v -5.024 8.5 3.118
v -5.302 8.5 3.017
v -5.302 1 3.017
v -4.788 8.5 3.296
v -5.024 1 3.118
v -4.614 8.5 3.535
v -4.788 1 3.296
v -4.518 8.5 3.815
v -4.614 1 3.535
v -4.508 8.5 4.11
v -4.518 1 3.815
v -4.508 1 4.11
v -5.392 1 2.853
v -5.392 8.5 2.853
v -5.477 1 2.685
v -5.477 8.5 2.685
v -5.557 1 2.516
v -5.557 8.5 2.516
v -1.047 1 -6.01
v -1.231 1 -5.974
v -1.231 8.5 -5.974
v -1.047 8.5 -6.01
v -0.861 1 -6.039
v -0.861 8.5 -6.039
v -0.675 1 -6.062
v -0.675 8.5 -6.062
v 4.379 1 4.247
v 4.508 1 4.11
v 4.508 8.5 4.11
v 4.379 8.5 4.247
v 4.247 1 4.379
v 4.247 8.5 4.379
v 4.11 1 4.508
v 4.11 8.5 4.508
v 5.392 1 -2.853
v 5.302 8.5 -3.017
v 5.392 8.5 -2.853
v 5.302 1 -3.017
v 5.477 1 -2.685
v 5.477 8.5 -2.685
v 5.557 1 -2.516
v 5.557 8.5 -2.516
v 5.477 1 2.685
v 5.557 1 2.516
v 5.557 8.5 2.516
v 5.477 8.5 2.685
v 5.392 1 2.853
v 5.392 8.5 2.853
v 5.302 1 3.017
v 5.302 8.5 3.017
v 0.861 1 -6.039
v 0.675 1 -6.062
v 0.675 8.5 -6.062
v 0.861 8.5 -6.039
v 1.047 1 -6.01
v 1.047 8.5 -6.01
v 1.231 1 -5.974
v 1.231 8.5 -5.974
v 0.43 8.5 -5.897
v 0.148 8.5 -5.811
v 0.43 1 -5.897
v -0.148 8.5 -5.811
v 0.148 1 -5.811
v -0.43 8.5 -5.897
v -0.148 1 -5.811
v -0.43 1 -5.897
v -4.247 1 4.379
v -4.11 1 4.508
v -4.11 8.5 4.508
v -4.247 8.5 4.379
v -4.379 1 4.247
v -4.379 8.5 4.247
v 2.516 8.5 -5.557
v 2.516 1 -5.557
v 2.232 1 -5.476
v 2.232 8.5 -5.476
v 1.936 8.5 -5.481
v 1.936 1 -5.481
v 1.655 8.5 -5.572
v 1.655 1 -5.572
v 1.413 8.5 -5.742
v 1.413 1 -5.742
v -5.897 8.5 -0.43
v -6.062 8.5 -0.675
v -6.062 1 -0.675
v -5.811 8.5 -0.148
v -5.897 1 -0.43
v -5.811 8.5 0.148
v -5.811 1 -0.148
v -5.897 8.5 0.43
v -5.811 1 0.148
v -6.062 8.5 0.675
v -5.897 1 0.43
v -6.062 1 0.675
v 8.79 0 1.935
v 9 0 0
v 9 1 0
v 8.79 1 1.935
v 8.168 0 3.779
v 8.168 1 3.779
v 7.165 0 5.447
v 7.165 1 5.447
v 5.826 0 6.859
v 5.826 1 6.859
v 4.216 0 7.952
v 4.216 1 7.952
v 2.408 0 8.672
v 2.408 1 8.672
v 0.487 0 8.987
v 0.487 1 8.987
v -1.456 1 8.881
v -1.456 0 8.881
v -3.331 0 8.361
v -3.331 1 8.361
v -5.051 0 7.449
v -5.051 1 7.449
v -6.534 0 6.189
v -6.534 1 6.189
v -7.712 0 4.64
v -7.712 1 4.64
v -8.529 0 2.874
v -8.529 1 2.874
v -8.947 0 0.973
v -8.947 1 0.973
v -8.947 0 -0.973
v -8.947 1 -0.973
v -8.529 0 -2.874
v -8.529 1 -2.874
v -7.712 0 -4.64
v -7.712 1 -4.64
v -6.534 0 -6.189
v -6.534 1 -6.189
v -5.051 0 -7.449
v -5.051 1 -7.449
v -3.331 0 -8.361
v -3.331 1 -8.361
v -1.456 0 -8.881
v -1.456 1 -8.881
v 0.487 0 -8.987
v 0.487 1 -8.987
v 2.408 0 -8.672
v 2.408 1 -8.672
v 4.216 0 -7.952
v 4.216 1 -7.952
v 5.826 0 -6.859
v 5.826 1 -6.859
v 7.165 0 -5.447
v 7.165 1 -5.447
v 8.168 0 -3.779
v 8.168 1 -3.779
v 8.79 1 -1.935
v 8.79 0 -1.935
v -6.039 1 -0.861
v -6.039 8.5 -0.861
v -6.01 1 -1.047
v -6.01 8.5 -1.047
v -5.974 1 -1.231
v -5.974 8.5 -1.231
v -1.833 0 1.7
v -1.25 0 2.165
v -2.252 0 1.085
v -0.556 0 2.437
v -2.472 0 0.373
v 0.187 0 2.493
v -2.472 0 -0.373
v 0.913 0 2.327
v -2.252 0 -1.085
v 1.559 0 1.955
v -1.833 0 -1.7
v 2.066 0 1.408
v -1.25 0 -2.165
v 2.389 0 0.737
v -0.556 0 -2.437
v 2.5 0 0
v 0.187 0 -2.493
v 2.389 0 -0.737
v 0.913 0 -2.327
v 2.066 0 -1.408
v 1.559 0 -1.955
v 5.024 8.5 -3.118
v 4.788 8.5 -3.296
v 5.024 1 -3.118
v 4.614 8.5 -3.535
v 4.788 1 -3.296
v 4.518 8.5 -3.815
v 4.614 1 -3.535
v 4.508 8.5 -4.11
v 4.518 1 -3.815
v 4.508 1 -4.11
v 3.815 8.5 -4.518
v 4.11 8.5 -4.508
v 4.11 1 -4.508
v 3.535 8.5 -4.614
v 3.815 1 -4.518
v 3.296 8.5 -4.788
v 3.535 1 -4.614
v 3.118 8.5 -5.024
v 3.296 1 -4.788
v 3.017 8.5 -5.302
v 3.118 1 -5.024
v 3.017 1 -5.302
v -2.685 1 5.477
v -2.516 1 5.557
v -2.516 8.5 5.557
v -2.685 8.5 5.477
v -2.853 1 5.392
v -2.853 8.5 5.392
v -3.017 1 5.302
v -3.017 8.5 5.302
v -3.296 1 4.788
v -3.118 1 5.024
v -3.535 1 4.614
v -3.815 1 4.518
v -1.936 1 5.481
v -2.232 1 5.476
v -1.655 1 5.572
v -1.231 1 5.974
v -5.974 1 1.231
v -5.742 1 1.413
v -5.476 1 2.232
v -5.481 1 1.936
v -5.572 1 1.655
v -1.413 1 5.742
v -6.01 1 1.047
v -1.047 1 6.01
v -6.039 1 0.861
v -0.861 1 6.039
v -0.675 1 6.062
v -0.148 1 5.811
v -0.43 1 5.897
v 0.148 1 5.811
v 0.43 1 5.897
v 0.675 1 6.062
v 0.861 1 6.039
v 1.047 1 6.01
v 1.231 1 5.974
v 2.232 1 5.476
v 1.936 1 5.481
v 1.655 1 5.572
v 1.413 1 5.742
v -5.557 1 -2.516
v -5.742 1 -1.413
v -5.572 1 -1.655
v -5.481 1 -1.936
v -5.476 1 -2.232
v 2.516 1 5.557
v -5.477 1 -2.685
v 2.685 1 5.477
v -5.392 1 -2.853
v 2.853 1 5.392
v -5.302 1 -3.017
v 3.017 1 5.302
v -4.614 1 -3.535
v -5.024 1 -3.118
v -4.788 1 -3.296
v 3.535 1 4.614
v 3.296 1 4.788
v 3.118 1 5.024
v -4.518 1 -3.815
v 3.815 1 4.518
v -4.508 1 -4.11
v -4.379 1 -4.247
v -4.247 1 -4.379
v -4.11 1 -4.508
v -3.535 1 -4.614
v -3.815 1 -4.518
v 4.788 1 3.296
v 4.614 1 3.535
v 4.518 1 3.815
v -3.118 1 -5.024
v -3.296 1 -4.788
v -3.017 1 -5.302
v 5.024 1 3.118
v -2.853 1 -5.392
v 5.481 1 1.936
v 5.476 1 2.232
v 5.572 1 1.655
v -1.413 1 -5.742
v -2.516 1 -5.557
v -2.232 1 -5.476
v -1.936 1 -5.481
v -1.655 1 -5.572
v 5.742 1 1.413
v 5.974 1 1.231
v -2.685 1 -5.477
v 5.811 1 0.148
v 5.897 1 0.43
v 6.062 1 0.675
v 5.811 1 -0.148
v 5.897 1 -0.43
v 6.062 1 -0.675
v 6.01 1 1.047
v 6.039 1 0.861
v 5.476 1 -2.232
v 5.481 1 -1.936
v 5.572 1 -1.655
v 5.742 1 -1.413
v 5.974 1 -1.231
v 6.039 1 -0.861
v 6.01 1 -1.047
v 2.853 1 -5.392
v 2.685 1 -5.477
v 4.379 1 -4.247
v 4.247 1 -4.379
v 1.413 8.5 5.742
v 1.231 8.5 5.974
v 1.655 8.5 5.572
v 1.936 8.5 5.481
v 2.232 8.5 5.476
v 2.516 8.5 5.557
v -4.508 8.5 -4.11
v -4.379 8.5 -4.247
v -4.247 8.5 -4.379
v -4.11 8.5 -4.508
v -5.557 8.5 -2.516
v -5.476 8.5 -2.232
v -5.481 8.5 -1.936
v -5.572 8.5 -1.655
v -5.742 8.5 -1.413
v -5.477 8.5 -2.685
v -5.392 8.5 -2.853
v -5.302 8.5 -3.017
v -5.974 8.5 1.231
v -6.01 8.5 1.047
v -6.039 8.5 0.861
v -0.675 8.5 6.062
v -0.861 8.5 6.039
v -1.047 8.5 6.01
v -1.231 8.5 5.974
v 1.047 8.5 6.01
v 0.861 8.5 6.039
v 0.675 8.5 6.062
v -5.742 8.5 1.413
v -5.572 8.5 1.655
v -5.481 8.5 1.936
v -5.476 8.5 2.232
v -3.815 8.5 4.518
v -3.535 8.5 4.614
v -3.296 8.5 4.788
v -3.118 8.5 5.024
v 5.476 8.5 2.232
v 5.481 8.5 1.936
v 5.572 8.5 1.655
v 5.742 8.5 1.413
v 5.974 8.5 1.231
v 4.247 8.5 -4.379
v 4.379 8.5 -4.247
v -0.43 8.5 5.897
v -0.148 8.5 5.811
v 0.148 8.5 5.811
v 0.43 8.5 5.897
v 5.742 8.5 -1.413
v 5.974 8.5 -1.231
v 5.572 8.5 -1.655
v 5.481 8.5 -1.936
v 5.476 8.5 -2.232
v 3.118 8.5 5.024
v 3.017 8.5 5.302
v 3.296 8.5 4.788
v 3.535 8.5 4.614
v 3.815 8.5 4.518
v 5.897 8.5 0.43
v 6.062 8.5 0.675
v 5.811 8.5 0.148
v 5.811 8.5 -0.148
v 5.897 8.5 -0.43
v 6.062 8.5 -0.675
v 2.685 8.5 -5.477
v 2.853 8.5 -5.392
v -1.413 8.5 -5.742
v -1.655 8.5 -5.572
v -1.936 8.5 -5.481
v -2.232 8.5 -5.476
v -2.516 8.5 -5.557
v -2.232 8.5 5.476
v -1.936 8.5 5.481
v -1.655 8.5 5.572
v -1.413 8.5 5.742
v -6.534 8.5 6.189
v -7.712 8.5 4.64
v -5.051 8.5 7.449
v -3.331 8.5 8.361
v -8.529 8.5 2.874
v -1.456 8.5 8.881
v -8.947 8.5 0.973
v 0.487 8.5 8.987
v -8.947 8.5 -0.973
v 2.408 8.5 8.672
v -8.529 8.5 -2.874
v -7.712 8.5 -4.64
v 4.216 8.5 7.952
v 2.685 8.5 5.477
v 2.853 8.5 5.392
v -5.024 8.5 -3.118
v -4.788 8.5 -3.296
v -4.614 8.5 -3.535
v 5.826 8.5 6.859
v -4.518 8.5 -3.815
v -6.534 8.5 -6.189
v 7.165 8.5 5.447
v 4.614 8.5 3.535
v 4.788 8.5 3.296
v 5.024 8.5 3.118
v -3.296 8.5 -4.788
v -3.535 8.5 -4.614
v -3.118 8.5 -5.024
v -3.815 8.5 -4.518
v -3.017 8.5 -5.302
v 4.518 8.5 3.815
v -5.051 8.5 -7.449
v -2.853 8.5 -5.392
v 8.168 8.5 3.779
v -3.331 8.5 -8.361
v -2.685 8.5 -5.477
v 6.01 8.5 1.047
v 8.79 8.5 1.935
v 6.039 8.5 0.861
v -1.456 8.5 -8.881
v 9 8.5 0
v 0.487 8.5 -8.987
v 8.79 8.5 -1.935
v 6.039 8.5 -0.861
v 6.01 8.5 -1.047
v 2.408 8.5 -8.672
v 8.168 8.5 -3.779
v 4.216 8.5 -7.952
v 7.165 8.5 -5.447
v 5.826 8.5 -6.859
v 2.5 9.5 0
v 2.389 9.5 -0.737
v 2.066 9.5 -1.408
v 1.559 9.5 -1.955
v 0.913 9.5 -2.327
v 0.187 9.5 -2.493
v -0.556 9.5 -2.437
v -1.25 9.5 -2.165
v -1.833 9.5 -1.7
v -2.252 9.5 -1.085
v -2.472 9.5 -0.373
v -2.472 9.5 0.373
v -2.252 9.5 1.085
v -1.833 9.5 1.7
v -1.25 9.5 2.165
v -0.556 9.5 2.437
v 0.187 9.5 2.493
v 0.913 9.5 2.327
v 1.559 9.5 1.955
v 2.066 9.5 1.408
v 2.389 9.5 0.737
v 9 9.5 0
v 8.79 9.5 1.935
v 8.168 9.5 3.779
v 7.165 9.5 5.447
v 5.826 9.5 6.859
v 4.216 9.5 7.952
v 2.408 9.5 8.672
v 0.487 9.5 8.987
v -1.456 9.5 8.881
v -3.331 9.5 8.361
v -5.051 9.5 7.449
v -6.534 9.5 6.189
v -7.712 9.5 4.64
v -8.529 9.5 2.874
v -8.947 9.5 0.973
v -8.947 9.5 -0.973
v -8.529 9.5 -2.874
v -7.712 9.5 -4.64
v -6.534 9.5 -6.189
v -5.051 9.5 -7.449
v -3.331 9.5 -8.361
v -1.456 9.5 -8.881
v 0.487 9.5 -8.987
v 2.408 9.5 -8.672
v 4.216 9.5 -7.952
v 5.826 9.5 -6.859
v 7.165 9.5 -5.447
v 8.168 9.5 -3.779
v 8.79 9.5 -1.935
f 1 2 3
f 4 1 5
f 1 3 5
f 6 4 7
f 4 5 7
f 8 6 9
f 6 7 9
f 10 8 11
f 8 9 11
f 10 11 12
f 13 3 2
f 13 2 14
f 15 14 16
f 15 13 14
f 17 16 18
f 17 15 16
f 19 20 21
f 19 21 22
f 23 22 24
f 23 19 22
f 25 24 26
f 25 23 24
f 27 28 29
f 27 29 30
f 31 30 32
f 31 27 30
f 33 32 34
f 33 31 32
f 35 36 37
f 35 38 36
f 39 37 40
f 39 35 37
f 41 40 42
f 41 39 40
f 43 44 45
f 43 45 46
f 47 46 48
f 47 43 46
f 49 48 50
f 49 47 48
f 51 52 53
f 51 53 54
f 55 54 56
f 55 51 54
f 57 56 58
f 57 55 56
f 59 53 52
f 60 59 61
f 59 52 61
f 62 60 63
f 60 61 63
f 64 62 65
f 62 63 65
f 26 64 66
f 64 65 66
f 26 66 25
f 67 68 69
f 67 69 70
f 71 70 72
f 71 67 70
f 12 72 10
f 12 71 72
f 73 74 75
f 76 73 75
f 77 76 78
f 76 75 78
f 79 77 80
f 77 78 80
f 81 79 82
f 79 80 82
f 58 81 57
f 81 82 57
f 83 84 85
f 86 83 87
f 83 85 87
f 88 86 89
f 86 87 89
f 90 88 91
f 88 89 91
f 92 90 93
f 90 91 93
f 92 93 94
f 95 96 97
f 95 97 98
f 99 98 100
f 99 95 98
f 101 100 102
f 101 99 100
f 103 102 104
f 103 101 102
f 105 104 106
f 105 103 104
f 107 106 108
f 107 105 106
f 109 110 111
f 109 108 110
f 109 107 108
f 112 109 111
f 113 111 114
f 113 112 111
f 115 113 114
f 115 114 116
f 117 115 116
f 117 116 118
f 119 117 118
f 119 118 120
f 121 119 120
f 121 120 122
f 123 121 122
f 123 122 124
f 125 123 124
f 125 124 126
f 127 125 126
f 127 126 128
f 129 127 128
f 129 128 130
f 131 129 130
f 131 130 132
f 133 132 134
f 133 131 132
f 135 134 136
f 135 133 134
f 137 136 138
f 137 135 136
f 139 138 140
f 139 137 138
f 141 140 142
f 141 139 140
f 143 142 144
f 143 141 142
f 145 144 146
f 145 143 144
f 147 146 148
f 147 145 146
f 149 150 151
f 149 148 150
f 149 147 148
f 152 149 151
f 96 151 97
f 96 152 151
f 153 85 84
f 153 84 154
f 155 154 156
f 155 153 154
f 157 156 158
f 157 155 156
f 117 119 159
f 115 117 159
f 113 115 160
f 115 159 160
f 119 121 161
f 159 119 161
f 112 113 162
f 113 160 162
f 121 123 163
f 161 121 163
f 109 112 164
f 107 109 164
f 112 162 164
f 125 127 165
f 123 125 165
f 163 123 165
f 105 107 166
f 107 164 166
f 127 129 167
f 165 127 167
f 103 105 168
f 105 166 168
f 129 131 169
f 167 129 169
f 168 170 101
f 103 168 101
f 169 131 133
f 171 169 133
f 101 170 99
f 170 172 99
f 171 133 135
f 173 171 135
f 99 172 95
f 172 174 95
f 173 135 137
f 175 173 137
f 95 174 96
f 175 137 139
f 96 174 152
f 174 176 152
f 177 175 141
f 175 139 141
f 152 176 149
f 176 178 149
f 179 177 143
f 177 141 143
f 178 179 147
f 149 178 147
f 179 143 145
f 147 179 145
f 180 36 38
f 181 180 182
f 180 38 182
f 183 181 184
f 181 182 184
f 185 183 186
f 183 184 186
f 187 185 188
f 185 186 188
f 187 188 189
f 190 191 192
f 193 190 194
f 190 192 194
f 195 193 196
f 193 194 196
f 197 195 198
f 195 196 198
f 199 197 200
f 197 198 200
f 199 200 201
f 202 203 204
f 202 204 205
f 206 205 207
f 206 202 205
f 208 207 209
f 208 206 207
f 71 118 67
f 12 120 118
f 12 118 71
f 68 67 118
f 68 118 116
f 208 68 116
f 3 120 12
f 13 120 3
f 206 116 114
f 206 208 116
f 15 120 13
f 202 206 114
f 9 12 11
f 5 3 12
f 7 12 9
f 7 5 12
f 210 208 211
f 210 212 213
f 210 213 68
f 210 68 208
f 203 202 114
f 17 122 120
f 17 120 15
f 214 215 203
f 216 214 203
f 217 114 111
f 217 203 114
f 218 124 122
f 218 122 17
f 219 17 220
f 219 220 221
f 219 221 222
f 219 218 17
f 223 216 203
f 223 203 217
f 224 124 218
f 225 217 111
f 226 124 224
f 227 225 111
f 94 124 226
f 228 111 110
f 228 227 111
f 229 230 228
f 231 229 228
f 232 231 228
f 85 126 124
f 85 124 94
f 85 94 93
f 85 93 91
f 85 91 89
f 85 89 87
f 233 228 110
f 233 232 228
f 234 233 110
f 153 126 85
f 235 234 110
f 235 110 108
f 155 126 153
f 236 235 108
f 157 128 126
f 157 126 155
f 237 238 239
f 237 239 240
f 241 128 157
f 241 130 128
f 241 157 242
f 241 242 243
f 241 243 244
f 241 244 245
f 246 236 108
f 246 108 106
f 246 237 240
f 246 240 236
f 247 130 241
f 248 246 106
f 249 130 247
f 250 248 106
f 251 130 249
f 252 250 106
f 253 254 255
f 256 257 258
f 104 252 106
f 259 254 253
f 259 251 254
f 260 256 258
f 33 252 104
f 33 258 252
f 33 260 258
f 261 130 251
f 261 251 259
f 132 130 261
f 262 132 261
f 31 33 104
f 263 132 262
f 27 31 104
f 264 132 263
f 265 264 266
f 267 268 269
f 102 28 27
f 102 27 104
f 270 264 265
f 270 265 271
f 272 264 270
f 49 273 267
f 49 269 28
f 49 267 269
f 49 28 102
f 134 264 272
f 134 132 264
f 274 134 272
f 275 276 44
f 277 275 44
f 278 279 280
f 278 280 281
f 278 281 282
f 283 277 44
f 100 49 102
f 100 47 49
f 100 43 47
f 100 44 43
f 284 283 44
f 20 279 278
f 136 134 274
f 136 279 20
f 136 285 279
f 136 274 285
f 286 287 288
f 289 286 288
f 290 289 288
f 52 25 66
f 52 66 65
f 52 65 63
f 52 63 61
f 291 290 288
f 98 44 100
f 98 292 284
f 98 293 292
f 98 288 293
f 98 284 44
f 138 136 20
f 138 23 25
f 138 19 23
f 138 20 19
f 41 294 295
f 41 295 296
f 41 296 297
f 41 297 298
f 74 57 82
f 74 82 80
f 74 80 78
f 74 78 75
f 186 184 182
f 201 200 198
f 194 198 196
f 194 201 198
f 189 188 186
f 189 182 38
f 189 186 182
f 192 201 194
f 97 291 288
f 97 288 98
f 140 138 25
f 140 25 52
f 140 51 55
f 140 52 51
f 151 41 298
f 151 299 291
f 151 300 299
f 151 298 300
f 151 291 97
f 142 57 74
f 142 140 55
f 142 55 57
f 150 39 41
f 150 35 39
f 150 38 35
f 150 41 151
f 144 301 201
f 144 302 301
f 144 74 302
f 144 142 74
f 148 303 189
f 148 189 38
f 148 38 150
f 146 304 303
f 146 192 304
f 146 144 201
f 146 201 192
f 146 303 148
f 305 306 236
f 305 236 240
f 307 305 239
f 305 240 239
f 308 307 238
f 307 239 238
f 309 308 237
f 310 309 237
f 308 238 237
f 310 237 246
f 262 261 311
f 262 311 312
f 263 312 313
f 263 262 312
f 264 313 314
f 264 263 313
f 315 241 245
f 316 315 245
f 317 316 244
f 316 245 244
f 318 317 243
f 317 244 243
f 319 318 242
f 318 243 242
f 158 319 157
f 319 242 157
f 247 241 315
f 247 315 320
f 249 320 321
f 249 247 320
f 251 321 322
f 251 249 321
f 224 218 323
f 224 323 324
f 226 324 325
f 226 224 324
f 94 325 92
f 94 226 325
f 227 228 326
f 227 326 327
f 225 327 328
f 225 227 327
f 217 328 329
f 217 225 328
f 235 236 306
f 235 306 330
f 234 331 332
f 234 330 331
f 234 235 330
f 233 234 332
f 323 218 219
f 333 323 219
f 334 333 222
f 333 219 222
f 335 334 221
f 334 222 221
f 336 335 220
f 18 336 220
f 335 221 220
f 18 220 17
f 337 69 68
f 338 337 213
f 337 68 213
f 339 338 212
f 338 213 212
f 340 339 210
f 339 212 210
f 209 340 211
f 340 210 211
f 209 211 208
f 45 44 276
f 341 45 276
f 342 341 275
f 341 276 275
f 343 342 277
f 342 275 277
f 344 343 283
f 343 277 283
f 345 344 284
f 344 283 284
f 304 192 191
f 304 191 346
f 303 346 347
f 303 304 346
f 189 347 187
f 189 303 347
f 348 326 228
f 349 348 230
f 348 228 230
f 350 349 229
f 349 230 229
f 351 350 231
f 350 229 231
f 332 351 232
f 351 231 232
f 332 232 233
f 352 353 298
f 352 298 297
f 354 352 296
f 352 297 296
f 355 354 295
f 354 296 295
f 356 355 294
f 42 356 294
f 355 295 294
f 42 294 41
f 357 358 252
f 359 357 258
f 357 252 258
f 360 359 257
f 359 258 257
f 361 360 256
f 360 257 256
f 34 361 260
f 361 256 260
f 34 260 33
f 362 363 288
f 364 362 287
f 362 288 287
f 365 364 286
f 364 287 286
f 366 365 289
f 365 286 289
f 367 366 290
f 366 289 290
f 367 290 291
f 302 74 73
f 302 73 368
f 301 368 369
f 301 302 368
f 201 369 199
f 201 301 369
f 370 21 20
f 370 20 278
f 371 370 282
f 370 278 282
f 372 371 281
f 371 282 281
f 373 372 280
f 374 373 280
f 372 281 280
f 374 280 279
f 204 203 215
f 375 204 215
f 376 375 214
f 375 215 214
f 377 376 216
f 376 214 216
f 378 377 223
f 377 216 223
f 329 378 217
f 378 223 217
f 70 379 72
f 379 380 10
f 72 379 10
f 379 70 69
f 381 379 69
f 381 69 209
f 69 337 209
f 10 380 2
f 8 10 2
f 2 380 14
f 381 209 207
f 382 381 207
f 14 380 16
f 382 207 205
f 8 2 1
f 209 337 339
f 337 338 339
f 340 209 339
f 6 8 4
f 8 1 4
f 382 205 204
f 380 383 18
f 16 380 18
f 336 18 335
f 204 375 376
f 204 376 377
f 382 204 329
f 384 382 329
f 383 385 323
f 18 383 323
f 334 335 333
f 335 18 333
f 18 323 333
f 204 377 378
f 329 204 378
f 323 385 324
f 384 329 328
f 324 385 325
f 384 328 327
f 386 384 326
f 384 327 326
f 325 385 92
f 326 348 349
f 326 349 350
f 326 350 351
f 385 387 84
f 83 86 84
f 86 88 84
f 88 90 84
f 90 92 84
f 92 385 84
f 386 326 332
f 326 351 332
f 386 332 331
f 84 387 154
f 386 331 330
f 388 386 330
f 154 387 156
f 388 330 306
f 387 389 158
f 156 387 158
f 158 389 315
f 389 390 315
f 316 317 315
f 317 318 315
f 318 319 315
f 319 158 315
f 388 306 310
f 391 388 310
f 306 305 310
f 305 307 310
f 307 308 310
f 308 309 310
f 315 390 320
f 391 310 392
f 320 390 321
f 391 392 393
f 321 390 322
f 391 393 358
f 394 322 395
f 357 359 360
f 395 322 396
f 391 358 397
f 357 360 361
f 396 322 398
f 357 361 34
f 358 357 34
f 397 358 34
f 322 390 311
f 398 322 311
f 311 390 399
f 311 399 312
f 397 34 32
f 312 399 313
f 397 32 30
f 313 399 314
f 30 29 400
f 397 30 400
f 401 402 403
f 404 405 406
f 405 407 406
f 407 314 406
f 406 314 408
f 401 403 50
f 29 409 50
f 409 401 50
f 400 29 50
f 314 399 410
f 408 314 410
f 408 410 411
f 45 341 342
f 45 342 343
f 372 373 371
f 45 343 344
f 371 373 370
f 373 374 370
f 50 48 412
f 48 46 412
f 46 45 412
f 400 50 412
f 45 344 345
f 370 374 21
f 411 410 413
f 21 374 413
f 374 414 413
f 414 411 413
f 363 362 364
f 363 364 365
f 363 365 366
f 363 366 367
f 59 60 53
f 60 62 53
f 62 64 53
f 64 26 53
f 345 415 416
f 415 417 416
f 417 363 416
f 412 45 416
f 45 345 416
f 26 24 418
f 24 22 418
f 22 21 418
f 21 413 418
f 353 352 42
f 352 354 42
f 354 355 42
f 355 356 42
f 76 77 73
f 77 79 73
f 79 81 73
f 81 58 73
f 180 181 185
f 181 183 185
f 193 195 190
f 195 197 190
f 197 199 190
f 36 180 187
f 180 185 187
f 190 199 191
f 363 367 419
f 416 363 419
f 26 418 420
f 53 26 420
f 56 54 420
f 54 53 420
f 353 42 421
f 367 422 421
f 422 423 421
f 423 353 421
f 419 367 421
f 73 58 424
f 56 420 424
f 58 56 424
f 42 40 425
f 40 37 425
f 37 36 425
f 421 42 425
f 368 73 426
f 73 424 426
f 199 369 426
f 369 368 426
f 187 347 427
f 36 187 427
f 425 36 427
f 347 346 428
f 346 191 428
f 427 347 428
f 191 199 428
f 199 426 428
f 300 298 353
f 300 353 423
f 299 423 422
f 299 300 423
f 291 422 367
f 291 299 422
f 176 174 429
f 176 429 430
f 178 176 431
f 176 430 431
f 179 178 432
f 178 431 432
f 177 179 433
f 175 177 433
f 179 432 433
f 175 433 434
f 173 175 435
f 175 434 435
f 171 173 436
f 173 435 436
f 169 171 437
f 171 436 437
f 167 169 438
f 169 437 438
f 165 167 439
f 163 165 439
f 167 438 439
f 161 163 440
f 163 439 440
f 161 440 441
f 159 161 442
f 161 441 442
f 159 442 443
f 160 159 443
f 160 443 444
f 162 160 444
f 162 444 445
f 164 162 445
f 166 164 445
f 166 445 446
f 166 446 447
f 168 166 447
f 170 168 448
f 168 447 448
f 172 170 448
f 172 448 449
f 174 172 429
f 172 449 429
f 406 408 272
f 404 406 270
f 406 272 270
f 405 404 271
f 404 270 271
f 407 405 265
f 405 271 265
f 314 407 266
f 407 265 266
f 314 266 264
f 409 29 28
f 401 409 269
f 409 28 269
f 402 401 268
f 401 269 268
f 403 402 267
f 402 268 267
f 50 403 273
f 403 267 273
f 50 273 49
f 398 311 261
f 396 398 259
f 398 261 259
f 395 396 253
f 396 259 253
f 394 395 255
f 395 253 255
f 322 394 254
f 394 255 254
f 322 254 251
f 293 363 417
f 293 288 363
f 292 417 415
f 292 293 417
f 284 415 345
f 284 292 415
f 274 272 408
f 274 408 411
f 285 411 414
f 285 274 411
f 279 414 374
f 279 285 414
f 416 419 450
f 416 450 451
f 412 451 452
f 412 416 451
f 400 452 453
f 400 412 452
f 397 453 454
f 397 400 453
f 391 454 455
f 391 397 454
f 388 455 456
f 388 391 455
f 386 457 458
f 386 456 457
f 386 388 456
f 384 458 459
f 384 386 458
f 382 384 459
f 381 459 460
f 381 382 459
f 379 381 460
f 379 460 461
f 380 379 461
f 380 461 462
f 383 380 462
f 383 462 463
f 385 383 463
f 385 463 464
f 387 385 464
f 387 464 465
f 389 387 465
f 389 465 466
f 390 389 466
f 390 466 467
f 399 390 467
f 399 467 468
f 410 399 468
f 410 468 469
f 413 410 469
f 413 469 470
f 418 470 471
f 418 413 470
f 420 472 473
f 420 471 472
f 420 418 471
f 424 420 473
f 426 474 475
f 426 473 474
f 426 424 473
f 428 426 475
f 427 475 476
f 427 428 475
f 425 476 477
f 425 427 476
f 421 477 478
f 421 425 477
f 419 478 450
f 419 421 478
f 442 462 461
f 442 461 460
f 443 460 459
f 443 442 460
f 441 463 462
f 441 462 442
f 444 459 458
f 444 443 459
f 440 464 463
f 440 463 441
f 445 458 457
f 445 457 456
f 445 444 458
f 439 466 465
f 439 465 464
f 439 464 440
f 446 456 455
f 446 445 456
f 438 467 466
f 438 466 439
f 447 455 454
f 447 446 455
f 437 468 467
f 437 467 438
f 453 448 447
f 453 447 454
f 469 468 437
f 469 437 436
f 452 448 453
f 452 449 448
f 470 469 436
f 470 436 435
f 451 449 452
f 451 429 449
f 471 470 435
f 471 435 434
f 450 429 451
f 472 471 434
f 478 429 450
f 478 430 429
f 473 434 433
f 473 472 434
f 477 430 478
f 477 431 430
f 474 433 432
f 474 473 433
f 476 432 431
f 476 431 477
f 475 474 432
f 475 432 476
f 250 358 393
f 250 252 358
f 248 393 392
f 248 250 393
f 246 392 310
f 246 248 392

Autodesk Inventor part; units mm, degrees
ref_plane "YZ Plane" through (0, 0, 0) normal (1, 0, 0) x (0, 1, 0)
ref_plane "XZ Plane" through (0, 0, 0) normal (0, 1, 0) x (-1, 0, 0)
ref_plane "XY Plane" through (0, 0, 0) normal (0, 0, 1) x (1, 0, 0)
sketch "Sketch1" plane through (0, 0, 0) normal (0, 0, 1) x (1, 0, 0)
  line L0 (0, 0) -> (0, 9.5) construction
  line L1 (0, 9.5) -> (2.5, 9.5) construction
  line L2 (2.5, 9.5) -> (9, 9.5)
  line L3 (9, 9.5) -> (9, 8.5)
  line L4 (9, 8.5) -> (6.1, 8.5)
  line L5 (6.1, 8.5) -> (6.1, 1)
  line L6 (6.1, 1) -> (9, 1)
  line L7 (9, 1) -> (9, 0)
  line L8 (9, 0) -> (2.5, 0)
  line L9 (2.5, 0) -> (2.5, 9.5)
  dimension "d0" = 2.5
  dimension "d1" = 7.5
  dimension "d2" = 1
  dimension "d3" = 9
  dimension "d4" = 1
  dimension "d6" = 6.1
revolve "Revolution1" add sketch "Sketch1" angle 360 about axis through (0, 0, 0) along (0, 1, 0)
sketch "Sketch2" plane through (0, 1, 0) normal (0, 1, 0) x (1, 0, 0)
  line L0 (0, 0) -> (6.8, 0)
  circle A0 centre (6.8, 0) radius 1
  dimension "d8" = 6.8
  dimension "d9" = 2
extrude "Extrusion1" cut sketch "Sketch2" along normal up to surface (7.5 mm away)
pattern_circular "Circular Pattern1" count 20 over 360 about axis through (0, 4.75, 0) along (0, -1, 0) of "Extrusion1"
properties part number "20t GT2 Idler"
